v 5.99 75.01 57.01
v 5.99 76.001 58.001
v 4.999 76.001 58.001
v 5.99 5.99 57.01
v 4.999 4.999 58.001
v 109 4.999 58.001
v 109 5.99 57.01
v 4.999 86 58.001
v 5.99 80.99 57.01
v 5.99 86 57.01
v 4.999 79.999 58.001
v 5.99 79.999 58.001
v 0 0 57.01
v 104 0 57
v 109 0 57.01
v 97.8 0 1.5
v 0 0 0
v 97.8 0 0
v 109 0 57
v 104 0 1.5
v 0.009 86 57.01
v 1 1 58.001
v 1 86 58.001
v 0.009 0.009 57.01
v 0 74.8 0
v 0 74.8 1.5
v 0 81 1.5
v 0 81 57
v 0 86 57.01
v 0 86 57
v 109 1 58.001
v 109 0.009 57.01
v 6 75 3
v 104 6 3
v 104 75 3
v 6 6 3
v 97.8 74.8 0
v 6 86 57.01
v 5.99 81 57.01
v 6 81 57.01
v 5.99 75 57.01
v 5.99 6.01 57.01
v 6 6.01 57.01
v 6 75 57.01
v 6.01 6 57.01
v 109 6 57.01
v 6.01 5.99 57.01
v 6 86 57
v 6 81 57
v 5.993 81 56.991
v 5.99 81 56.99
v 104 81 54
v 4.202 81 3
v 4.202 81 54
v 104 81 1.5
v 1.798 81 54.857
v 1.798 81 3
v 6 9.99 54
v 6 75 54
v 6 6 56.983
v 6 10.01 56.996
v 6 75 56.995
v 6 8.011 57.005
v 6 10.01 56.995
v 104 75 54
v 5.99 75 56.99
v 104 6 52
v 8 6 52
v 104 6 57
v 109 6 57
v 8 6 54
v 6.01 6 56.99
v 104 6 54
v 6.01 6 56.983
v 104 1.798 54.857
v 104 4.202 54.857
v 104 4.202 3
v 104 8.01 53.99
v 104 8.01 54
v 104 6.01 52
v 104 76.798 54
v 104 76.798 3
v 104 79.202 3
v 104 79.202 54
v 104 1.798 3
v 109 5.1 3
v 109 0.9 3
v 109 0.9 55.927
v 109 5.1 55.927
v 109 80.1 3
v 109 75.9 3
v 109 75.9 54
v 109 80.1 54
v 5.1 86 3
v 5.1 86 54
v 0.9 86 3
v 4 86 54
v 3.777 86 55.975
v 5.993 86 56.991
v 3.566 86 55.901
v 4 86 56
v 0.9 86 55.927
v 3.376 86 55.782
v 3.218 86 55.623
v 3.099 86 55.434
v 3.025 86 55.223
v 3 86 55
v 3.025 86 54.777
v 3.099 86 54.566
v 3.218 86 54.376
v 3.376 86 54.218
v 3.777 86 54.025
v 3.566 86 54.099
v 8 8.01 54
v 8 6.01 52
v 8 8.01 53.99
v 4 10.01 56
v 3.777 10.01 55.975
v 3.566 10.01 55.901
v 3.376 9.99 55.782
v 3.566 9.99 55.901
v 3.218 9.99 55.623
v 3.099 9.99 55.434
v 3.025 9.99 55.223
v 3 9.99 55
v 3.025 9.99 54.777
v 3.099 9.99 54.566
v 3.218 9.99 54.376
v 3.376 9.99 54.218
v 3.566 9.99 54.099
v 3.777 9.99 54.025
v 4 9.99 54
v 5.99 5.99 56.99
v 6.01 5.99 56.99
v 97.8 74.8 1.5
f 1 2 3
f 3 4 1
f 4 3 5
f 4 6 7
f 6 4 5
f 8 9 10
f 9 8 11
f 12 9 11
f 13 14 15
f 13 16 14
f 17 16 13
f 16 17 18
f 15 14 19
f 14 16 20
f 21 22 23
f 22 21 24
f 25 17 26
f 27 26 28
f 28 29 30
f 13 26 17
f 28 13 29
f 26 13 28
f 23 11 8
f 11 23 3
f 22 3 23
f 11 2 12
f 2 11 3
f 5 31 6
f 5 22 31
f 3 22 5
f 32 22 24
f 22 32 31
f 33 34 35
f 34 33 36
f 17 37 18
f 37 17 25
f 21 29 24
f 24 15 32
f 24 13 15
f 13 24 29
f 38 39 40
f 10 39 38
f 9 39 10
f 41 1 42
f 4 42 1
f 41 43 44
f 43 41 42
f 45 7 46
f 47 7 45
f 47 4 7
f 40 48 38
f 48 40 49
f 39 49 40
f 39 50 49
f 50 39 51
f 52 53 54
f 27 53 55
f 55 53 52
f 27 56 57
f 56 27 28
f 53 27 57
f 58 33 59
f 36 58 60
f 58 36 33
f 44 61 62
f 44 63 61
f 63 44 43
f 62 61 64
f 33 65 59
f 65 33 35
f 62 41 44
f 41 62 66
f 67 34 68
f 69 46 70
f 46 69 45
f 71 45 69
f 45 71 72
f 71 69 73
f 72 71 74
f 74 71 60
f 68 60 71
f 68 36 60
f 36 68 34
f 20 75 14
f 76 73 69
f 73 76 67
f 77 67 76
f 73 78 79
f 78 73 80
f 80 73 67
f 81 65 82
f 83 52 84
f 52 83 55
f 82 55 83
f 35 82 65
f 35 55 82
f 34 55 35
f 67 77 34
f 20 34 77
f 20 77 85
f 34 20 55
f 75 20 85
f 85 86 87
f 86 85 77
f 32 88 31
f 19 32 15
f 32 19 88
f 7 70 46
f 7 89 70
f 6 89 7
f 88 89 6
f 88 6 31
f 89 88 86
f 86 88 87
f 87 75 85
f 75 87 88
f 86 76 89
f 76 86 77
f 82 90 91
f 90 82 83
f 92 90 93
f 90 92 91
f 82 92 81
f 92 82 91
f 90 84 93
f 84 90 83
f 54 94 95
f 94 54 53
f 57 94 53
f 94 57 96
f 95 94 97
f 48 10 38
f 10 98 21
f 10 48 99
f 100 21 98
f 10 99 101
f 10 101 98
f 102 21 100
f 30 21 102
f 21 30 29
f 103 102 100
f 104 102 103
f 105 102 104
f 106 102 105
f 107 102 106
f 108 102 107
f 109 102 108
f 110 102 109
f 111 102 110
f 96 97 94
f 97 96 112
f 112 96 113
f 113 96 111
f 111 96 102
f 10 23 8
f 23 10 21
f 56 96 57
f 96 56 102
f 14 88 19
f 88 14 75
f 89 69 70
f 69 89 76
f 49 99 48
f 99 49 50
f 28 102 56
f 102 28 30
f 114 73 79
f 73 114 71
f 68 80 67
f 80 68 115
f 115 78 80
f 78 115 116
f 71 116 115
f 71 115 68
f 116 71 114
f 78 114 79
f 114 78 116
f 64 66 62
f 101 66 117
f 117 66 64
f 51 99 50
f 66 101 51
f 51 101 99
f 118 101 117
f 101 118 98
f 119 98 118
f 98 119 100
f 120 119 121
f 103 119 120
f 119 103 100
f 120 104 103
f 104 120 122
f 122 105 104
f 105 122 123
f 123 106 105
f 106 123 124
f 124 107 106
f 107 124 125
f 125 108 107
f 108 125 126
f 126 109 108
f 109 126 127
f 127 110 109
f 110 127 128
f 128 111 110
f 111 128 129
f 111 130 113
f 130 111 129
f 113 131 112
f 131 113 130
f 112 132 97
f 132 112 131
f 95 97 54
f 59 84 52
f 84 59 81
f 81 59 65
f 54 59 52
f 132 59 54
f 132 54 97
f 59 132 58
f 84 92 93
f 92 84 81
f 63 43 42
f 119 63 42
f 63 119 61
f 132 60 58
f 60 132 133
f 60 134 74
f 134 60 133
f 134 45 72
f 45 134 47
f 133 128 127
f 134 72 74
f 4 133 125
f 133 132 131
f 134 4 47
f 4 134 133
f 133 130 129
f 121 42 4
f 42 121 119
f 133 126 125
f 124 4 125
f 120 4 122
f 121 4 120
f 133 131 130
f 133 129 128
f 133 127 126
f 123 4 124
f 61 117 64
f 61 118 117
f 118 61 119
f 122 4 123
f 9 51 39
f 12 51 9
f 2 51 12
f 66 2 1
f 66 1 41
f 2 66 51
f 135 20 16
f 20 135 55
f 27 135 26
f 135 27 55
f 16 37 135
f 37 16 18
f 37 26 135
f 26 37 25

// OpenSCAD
// ============================================================================
// cutlery_box.scad
// Graduated 3-chamber disposable-cutlery box (Option 3) — CUT-FROM-SOLID port
// of build_box.py, for a 120 x 120 x 120 mm printer (AOSEED).
//
// WHY THIS PORT EXISTS (the whole point):
//   The hand-mesh generator (build_box.py) could not keep the 1 mm rim chamfer
//   continuous across the female dovetail joints, because where a slot's flared
//   corner crosses the sloped chamfer it needs a true boolean intersection.
//   OpenSCAD HAS that boolean kernel, so here we do exactly the "cut-from-solid"
//   thing:
//      1. Build the ENTIRE box as ONE solid, WITH the chamfer already on it.
//      2. difference() out vertical dovetail prisms ( /_\ cross-section ),
//         running from just above the base plate up THROUGH the rim, to both
//         (a) form the sliding-dovetail joints, and
//         (b) split the box into 6 bed-sized pieces.
//   Because the cut is a real boolean through the already-chamfered solid, the
//   sloped chamfer<->slot edge is produced for free => the rim chamfer stays
//   CONTINUOUS across every joint, with none of the sliver hacks.
//
// ----------------------------------------------------------------------------
// HOW TO USE
//   In the app:  set `part` below (or use the Customizer dropdown), F5 to
//                preview, F6 to render, then File > Export > STL.
//   One piece (CLI):
//      openscad -o body_knife_A.stl -D 'part="knife_A"' cutlery_box.scad
//   ALL SIX (bash, run from this folder):
//      for p in knife_A knife_B fork_A fork_B spoon_A spoon_B; do \
//        openscad -o "body_$p.stl" -D "part=\"$p\"" cutlery_box.scad ; done
//   PNG preview of one piece:
//      openscad -o knife_B.png --imgsize=1400,1000 --autocenter --viewall \
//        -D 'part="knife_B"' cutlery_box.scad
//
//   Pieces are modelled in ASSEMBLED coordinates (floor-down, z=0 is the bed),
//   so importing all six STLs together shows the assembled box directly; your
//   slicer will auto-drop each one onto the plate for printing.
//
// BED SANITY: every piece is <= 120 mm in X, Y, Z.
//   Z = 58 mm. Widest piece = spoon at 117 mm (Y). A-halves reach 109 mm (X,
//   including the protruding dovetail key). All under 120.
//
// !! I could NOT run OpenSCAD to verify this file (no binary in my sandbox) !!
//   - The rim chamfer is a SMOOTH, true-45 bevel built from hull() frustums of
//     convex rectangles. Works in every OpenSCAD since ~2015 (incl. Homebrew
//     2021.01). No stepped staircase -- and, crucially, it makes box() a clean
//     well-formed solid so the per-part booleans resolve reliably (the old
//     14-slice staircase was fragile and CGAL was dropping the walls of the
//     interior parts, leaving only the key prisms => "floating boxes").
//   - roof() is still available behind USE_ROOF=true for those who have it
//     (2021.01+ snapshots); for THIS rectangular design it is identical, so it
//     is NOT required.
//   - After F6, check the console for "WARNING"/"not a valid 2-manifold".
//     If a tenon ever looks detached, bump EPS to 0.05.
// ============================================================================


/* [Part to render / export] */
part = "knife_A"; // [knife_A, knife_B, fork_A, fork_B, spoon_A, spoon_B, assembly]

/* [Chamfer method] */
// false = smooth hull() frustum bevel (default, any OpenSCAD); true = roof() (2021.01+)
USE_ROOF = false;

/* [Heights (mm)] */
BASE   = 3.0;     // floor / base-plate thickness
COMP_H = 55.0;    // interior wall height above the floor (cutlery stack depth)

/* [Walls (mm)] */
HOST_T   = 6.0;     // thickness of every wall (thick enough to host a dovetail)
HALF_LEN = 104.0;   // printed length of each half (A = near, B = far); <120 incl. key

/* [Chamber bays (mm)] */
N_COL     = 3;       // columns of cutlery per chamber
KNIFE_COL = 23.0;    // -> knife bay 69  (3 x 19 mm knives + play)
FORK_COL  = 33.0;    // -> fork  bay 99  (3 x 29 mm forks  + play)
SPOON_COL = 37.0;    // -> spoon bay 111 (3 x 34 mm spoons + play, trimmed <120)

/* [Dovetail joint (mm)] */
DT_DEPTH = 5.0;   // tail protrusion past the seam (male key depth)
DT_NECK  = 1.2;   // half-width at the seam face (narrow)
DT_FLARE = 2.1;   // half-width at the tip (wide -> locks)
DT_CLR   = 0.4;   // FLANK/seam slide clearance added to the female socket (do not change for fit)
DT_DEPTH_RELIEF = 0.3; // extra depth on the socket BACK only, so the tail tip never bottoms out

/* [Hidden-dovetail top cap / "hat" (mm)] */
// The dovetail otherwise shows its trapezoid outline on the TOP edge of the wall.
// To hide it, the MALE piece extends the wall's full-width top (chamfer included)
// across the key footprint -> a flush, continuous top. The FEMALE piece gets a
// matching top RECESS (cap footprint + CAP_CLR) so the cap drops straight in.
// Result: the top reads as one surface with a single straight seam line at the cap
// tip; the dovetail joinery lives entirely below the cap.
//
// SELF-SUPPORTING UNDERSIDE: the cap reaches the FULL wall width at the chamfer base
// (so the top edge reads as the wall extended, with NO recessed sliver on the outer
// face), and its underside is ONE planar ramp from the chamfer's OUTER CORNER
// (half-width HOST_T/2 at z = BODY_H-CHAMFER) down to the dovetail-neck half-width
// (CAP_FOOT) at CAP_SLANT_DEG from horizontal. No little horizontal step. The ramp
// reaching full width exactly at the chamfer base means "ramp top" == "chamfer base"
// (CAP_H is DERIVED). The FEMALE recess is the same ramp + CAP_CLR play.
// TRADEOFF: because the cap runs all the way to the outer corner, the female wall
// tapers to ~0 at z = BODY_H-CHAMFER -> a thin feather edge at the joint (gradual at
// CAP_SLANT_DEG, hidden inside the joint when assembled). Accepted per design intent.
CAP_SLANT_DEG = 50;     // cap underside ramp angle from horizontal (50 = self-supporting, long flare)
CAP_FOOT = DT_NECK;     // cap-underside half-width where it meets the dovetail neck
CAP_CLR = 0.3;          // slide clearance so the male cap seats into the female top recess

/* [Rim chamfer (mm)] */
CHAMFER = 1.0;    // 45-deg comfort break broken along the top wall edges

/* [Base half-lap / anti-warp (mm)] */
// Neighbouring base plates overlap as a HORIZONTAL half-lap (shiplap) at mid-base
// height, so corners stay coplanar (no lift/protrusion). Horizontal lap faces do
// NOT bind the vertical-drop assembly. Shingle direction: A->B and knife->fork->spoon.
LAP_LEN = 6;        // overlap past the A/B seam and the knife/fork seam
LAP_LEN_FS = 2;     // overlap past the fork/SPOON seam -- SMALLER: spoon is the
                    // tightest piece (117mm of the 120mm bed); a 6mm lap there
                    // would push spoon to 123mm. 2mm keeps spoon at 119mm.
LAP_Z   = BASE/2;   // 1.5 -- horizontal split height of the lap (bottom vs top half)
LAP_CLR = 0.2;      // in-plane clearance so the shelf isn't a press fit

/* [Lid — box features that receive a flat ORDERED clear sheet] */
// The lid itself is NOT printed: it's a flat ~2 mm PETG/Tritan sheet, bullnose-polished
// edges (r=LID_EDGE_R), ordered to size. We only model the box features that receive it.
LID_T            = 2.0;   // ordered sheet thickness
LID_EDGE_R       = 1.0;   // ordered sheet bullnose edge radius (for the sheet order spec)
LID_PLAY         = 0.4;   // total vertical play in the hinge groove (sheet + this)
LID_RECESS       = 2.0;   // lid TOP sits this far BELOW the rim, so the journal pocket is fully
                          // capped (rim caps the bullnose -> retains the lid when raised; tilt-in)
HINGE_AT_MINUS_X = true;  // hinge on the -x (303mm) end wall; clip on +x. (flip = mirror; default delivered)
// perimeter support ledge (lid underside rests on it at z = BODY_H-LID_T)
LEDGE_W          = 2.0;   // ledge inward protrusion (its underside ramps back at 45 deg -> self-supporting)
GROOVE_END_INSET = 0.0;   // groove reaches the corners but RUNS OUT smoothly there (no end-face / no
                          // exposed bore); GROOVE_TAPER sets the run-out length
GROOVE_TAPER     = 4.0;   // y-length over which the eased mouth tapers out at each groove end
// hinge journal (cut into the inner face of the hinge end wall, CONTINUOUS along the long edge)
GROOVE_DEPTH     = 3.0;   // 2mm lead-in slot + 1mm pocket radius -> journal sits 2mm back from the
                          // face so its cap clears the swing relief and RETAINS the lid
GROOVE_POCKET_R  = 1.0;   // journal half-cylinder radius (the bullnose sheet edge rolls in it)
// clip latch (one localized retainer, centered on the clip end wall)
CLIP_W           = 18.0;  // clip width
CLIP_LIP         = 0.4;   // retaining overhang (0.3 light .. 0.6 firm)
CLIP_RAMP_H      = 1.6;   // cam-ramp height above the rim (press-to-close)
// finger scallop (semicircular dish in the rim, centered on & aligned with the clip)
SCALLOP_W        = 16.0;  // scallop width
SCALLOP_DEPTH    = 6.0;   // how far it dishes down from the rim


/* [Hidden] */
EPS      = 0.01;          // tiny overlap so abutting solids fuse cleanly in CGAL
// Upper-chamber pieces (fork, spoon) were cut by a cell plane laid EXACTLY on the
// divider wall's far face (the lower chamber owns that wall). intersection() along a
// plane coincident with an existing box face makes CGAL leave a ZERO-THICKNESS copy
// of the wall face -> edge-manifold + "watertight" but degenerate (OpenSCAD shows it
// as a blue back-face; Tinkercad thickens it into a phantom block). SEAM_EPS nudges
// those cut planes a hair INTO the open bay so they no longer coincide with any box
// face -> no flap. 0.02 mm is physically nothing but is well clear of CGAL's tolerance.
SEAM_EPS = 0.02;
CUT_OVER = 1.0;           // how far dovetail cutters overshoot the rim (clean cut)

BODY_H    = BASE + COMP_H;     // 58  total height
END_WALL  = HOST_T;            // end walls are dovetail hosts too -> equally thick
TOTAL_LEN = 2 * HALF_LEN;      // 208 assembled length (end wall .. end wall)

// hidden-cap ramp geometry (derived).
//   CAP_HW    = cap MAX half-width = HOST_T/2 (the full wall edge) at the chamfer base.
//   CAP_RISE  = vertical height of the self-supporting CAP_SLANT_DEG underside ramp.
//   CAP_ZRAMP = where the cap reaches full width = the chamfer base (BODY_H-CHAMFER), so
//               the ramp runs straight to the chamfer OUTER CORNER (no horizontal step).
//   CAP_ZBOT  = cap bottom = ramp start; CAP_H derived from it (for reference/report).
//   CAP_ZRAMP_R = recess ramp top, shifted down by CAP_CLR so the recess ramp stays
//               parallel to the cap ramp with uniform play.
CAP_HW      = HOST_T/2;   // cap reaches the FULL wall edge at the chamfer base
CAP_RISE    = (CAP_HW - CAP_FOOT) * tan(CAP_SLANT_DEG);
CAP_ZRAMP   = BODY_H - CHAMFER;               // full width exactly at the chamfer base / outer corner
CAP_ZBOT    = CAP_ZRAMP - CAP_RISE;
CAP_H       = BODY_H - CAP_ZBOT;              // derived; reported
CAP_ZRAMP_R = CAP_ZRAMP;   // recess ramp ALSO tops at the chamfer corner (mirror the cap) -> no vertical lip
// sanity checks
assert(CAP_ZBOT > BASE + 1,
       "cap zone dips too low -- raise CAP_SLANT_DEG");
assert(CAP_HW >= DT_FLARE,
       "cap too narrow to cover the dovetail tail");

// NOTE: lid-derived constants are defined BELOW the Y-layout block, because some of
// them (INTERIOR_Y0/Y1, CLIP_CY) depend on OUTER_L / OUTER_R / EXT_W. See "lid derived".

// bay widths
KNIFE_BAY = N_COL * KNIFE_COL; // 69
FORK_BAY  = N_COL * FORK_COL;  // 99
SPOON_BAY = N_COL * SPOON_COL; // 111

// ---- Y layout (width direction): wall | bay | divider | bay | divider | bay | wall
KNIFE_Y0 = 0;
KNIFE_Y1 = HOST_T + KNIFE_BAY + HOST_T;        // 0..81   (outer wall + bay + divider)
FORK_Y0  = KNIFE_Y1;                           // 81
FORK_Y1  = FORK_Y0 + FORK_BAY + HOST_T;        // 81..186 (bay + divider)
SPOON_Y0 = FORK_Y1;                            // 186
SPOON_Y1 = SPOON_Y0 + SPOON_BAY + HOST_T;      // 186..303(bay + outer wall)
EXT_W    = SPOON_Y1;                           // 303 total width

// lengthwise wall Y-bands [y0,y1] (host the A/B dovetails) + their centers
OUTER_L  = [0, HOST_T];                                       // [0,6]    c=3
DIV_KF   = [HOST_T + KNIFE_BAY, HOST_T + KNIFE_BAY + HOST_T]; // [75,81]  c=78
DIV_FS   = [FORK_Y0 + FORK_BAY, FORK_Y0 + FORK_BAY + HOST_T]; // [180,186]c=183
OUTER_R  = [SPOON_Y1 - HOST_T, SPOON_Y1];                     // [297,303]c=300

// ---- lid derived ---- (placed AFTER OUTER_L/OUTER_R/EXT_W so nothing is forward-referenced)
LID_TOP_Z   = BODY_H - LID_RECESS;        // 56  lid TOP (recessed); rim z=58 rises LID_RECESS above it
LID_Z_UNDER = LID_TOP_Z - LID_T;          // 54  lid underside / ledge top / lowered-divider top
POCKET_CZ   = LID_TOP_Z - LID_T/2;        // 55  journal centre (lid mid) -> pocket top = LID_TOP_Z = capped
// hinge end-wall inner face x + inward direction; clip end-wall inner face x + inward dir
HINGE_INX   = HINGE_AT_MINUS_X ? END_WALL : TOTAL_LEN - END_WALL;       // 6  (default)
HINGE_IN    = HINGE_AT_MINUS_X ? 1 : -1;  // interior direction from the hinge wall (+x default)
CLIP_INX    = HINGE_AT_MINUS_X ? TOTAL_LEN - END_WALL : END_WALL;       // 202 (default)
CLIP_IN     = HINGE_AT_MINUS_X ? -1 : 1;  // interior direction from the clip wall (-x default)
POCKET_CX   = HINGE_INX - HINGE_IN*(GROOVE_DEPTH - GROOVE_POCKET_R);    // 5  pocket centre x (INTO the wall)
INTERIOR_Y0 = OUTER_L[1];                 // 6   inner face of the -y short wall
INTERIOR_Y1 = OUTER_R[0];                 // 297 inner face of the +y short wall
CLIP_CY     = EXT_W/2;                     // 151.5 clip/scallop centre (in the fork chamber)
assert(POCKET_CZ - GROOVE_POCKET_R > BASE + 1,
       "journal dips too low -- reduce LID_RECESS or LID_T");
assert(POCKET_CZ + GROOVE_POCKET_R <= LID_TOP_Z + EPS,
       "journal not capped -- lower the lid (raise LID_RECESS) or shrink GROOVE_POCKET_R");
// NOTE: with LID_RECESS the lid underside (and lowered dividers) sit BELOW CAP_ZBOT. That is
// intended: the inner dividers are cut flat below the cap zone (their hidden caps are removed,
// but the lid covers them); the perimeter/end-wall caps are untouched (full-height walls).

// the three OPEN bays are rectangular holes in the wall footprint:
//   footprint = outer rectangle MINUS these bays  (== the 6 walls; verified).
// The smooth chamfer is built from exactly this decomposition.
BAY_X0 = END_WALL;              // 6
BAY_X1 = TOTAL_LEN - END_WALL;  // 202
BAYS = [
    [BAY_X0, BAY_X1, HOST_T,   HOST_T + KNIFE_BAY],   // knife bay [6,202] x [6,75]
    [BAY_X0, BAY_X1, FORK_Y0,  FORK_Y0 + FORK_BAY],   // fork  bay [6,202] x [81,180]
    [BAY_X0, BAY_X1, SPOON_Y0, SPOON_Y0 + SPOON_BAY], // spoon bay [6,202] x [186,297]
];

YC_OUTL  = OUTER_L[0] + HOST_T/2;   // 3   outer-left wall center
YC_DIVKF = DIV_KF[0]  + HOST_T/2;   // 78  knife/fork divider center
YC_DIVFS = DIV_FS[0]  + HOST_T/2;   // 183 fork/spoon divider center
YC_OUTR  = OUTER_R[0] + HOST_T/2;   // 300 outer-right wall center

// seams
AB_SEAM = HALF_LEN;               // 104  A/B length seam (x)
SEAM_KF = FORK_Y0;                // 81   knife/fork width seam (y)
SEAM_FS = SPOON_Y0;              // 186  fork/spoon width seam (y)
ENDC_A  = END_WALL/2;             // 3    A end-wall center (x) -> chamber dovetails
ENDC_B  = TOTAL_LEN - END_WALL/2; // 205  B end-wall center (x)


// ============================================================================
// 2D wall footprint (cross-section of all walls, constant in z for the straight
// part). Union of: 2 full-width end walls + 4 lengthwise walls between them.
// ============================================================================
module wall_footprint_2d() {
    // footprint = outer rectangle minus the 3 open bays  (== the 6 walls)
    difference() {
        square([TOTAL_LEN, EXT_W]);
        for (b = BAYS) translate([b[0], b[2]]) square([b[1] - b[0], b[3] - b[2]]);
    }
}

// ============================================================================
// The full chamfered box solid = base plate + walls with a continuous 1 mm
// top-rim chamfer. Built ONCE; every piece is carved out of this.
// ============================================================================
module chamfer_cap() {
    // SMOOTH 45 rim chamfer over z[BODY_H-CHAMFER, BODY_H], in absolute coords.
    zm = BODY_H - CHAMFER;
    if (USE_ROOF) {
        // exact straight-skeleton roof, capped at CHAMFER height (needs roof()).
        intersection() {
            translate([0,0,zm]) roof() wall_footprint_2d();
            translate([0,0,zm]) linear_extrude(CHAMFER + EPS) wall_footprint_2d();
        }
    } else {
        // DEFAULT: true 45 bevel as hull() frustums of CONVEX rectangles -> smooth
        // AND a clean manifold.  Since footprint = outer - bays, the chamfer of the
        // footprint = (outer rectangle beveled inward) MINUS (each bay beveled so it
        // grows toward the top, which bevels every bay-facing rim).  All hull()s are
        // on convex rectangles, so nothing gets convex-filled.
        difference() {
            // outer perimeter frustum: full outer rect at zm -> inset by CHAMFER at top
            hull() {
                translate([0,0,zm])     linear_extrude(0.001) square([TOTAL_LEN, EXT_W]);
                translate([0,0,BODY_H]) linear_extrude(0.001) offset(delta=-CHAMFER) square([TOTAL_LEN, EXT_W]);
            }
            // each bay grows by CHAMFER toward the top -> bevels its surrounding rim.
            // (overshoots z a hair past both ends so the cut is clean.)
            for (b = BAYS)
                hull() {
                    translate([0,0,zm-EPS])     linear_extrude(0.001)
                        translate([b[0],b[2]]) offset(delta=-EPS)        square([b[1]-b[0], b[3]-b[2]]);
                    translate([0,0,BODY_H+EPS]) linear_extrude(0.001)
                        translate([b[0],b[2]]) offset(delta=CHAMFER+EPS) square([b[1]-b[0], b[3]-b[2]]);
                }
        }
    }
}

module box() {
    zm = BODY_H - CHAMFER;
    union() {
        cube([TOTAL_LEN, EXT_W, BASE]);                                        // base plate z[0,3]
        translate([0,0,BASE]) linear_extrude(zm - BASE + EPS) wall_footprint_2d(); // straight walls z[3,57]
        chamfer_cap();                                                         // smooth chamfer z[57,58]
    }
}

// ============================================================================
// Dovetail prisms ( /_\ ). Vertical, z[BASE, BODY_H+CUT_OVER] so they cut
// through the rim but leave the base plate continuous. The near face is pushed
// back EPS so a male key always fuses to its wall.
//   male key   : half_n=DT_NECK,         half_f=DT_FLARE
//   female slot: half_n=DT_NECK+DT_CLR,  half_f=DT_FLARE+DT_CLR
// ============================================================================
module dt_prism_X(seam_x, yc, half_n, half_f) {   // perpendicular to X, grows +X
    translate([0,0,BASE]) linear_extrude(BODY_H - BASE + CUT_OVER)
        polygon([[seam_x - EPS,        yc - half_n],
                 [seam_x + DT_DEPTH,   yc - half_f],
                 [seam_x + DT_DEPTH,   yc + half_f],
                 [seam_x - EPS,        yc + half_n]]);
}
module dt_prism_Y(seam_y, xc, half_n, half_f) {   // perpendicular to Y, grows +Y
    translate([0,0,BASE]) linear_extrude(BODY_H - BASE + CUT_OVER)
        polygon([[xc - half_n, seam_y - EPS],
                 [xc - half_f, seam_y + DT_DEPTH],
                 [xc + half_f, seam_y + DT_DEPTH],
                 [xc + half_n, seam_y - EPS]]);
}
module ab_key   (yc)        { dt_prism_X(AB_SEAM, yc, DT_NECK, DT_FLARE); }
module ch_key   (seam_y, xc){ dt_prism_Y(seam_y, xc, DT_NECK, DT_FLARE); }

// Female sockets = male + DT_CLR on the flanks/seam (unchanged), PLUS a straight
// back-face relief of DT_DEPTH_RELIEF so the tail tip never bottoms out. The
// relief is a rectangle tacked onto the trapezoid's tip at the SAME flare width,
// so the angled flank faces (and their 0.4 mm slide clearance) are untouched.
module ab_socket(yc) {
    dt_prism_X(AB_SEAM, yc, DT_NECK + DT_CLR, DT_FLARE + DT_CLR);
    translate([0,0,BASE]) linear_extrude(BODY_H - BASE + CUT_OVER)
        translate([AB_SEAM + DT_DEPTH, yc - (DT_FLARE + DT_CLR)])
            square([DT_DEPTH_RELIEF, 2*(DT_FLARE + DT_CLR)]);          // back relief, +X
}
module ch_socket(seam_y, xc) {
    dt_prism_Y(seam_y, xc, DT_NECK + DT_CLR, DT_FLARE + DT_CLR);
    translate([0,0,BASE]) linear_extrude(BODY_H - BASE + CUT_OVER)
        translate([xc - (DT_FLARE + DT_CLR), seam_y + DT_DEPTH])
            square([2*(DT_FLARE + DT_CLR), DT_DEPTH_RELIEF]);          // back relief, +Y
}

// ===== hidden-dovetail top cap ("hat"), SELF-SUPPORTING underside ===============
// MALE cap: a FULL-wall-width hat whose underside is ONE planar ramp from the chamfer's
// OUTER CORNER (half-width CAP_HW = HOST_T/2 at CAP_ZRAMP = BODY_H-CHAMFER) down to the
// dovetail-neck half-width (CAP_FOOT) at CAP_SLANT_DEG from horizontal -> the self-
// supporting shoulder, running straight to the corner (no horizontal step). Built as
// hull(narrow bottom slab buried in the tail neck, full-width top slab through the rim);
// box() trims it to the wall and adds the continuous rim chamfer for free, so the outer
// top edge reads as the wall extended (no recessed sliver). The protruding NOSE is left
// SQUARE (vertical) -- hidden in the female socket when assembled.
// TRADEOFF: the female wall tapers to ~0 at z=BODY_H-CHAMFER (a thin feather edge at the
// joint, gradual at CAP_SLANT_DEG) -- accepted per design intent.
module ab_cap(yc) {   // A/B seam, grows +X past the seam (length direction)
    hull() {
        translate([AB_SEAM - EPS, yc - CAP_FOOT, CAP_ZBOT])
            cube([DT_DEPTH + EPS, 2*CAP_FOOT, EPS]);
        translate([AB_SEAM - EPS, yc - CAP_HW,   CAP_ZRAMP])
            cube([DT_DEPTH + EPS, 2*CAP_HW, (BODY_H + CUT_OVER) - CAP_ZRAMP]);
    }
}
module ch_cap(seam_y, xc) {   // chamber seam, grows +Y past the seam (in the end wall)
    hull() {
        translate([xc - CAP_FOOT, seam_y - EPS, CAP_ZBOT])
            cube([2*CAP_FOOT, DT_DEPTH + EPS, EPS]);
        translate([xc - CAP_HW,   seam_y - EPS, CAP_ZRAMP])
            cube([2*CAP_HW, DT_DEPTH + EPS, (BODY_H + CUT_OVER) - CAP_ZRAMP]);
    }
}
// FEMALE recess: the SAME ramp grown by CAP_CLR (flanks, tip, floor, and ramp shifted down
// by CAP_CLR so it stays parallel) -> the cap seats with uniform slide clearance. It opens
// to the wall edge (and a hair past, into air) so the cap's full-width corner drops in;
// this is what leaves the thin female feather at the top (accepted). Open upward + toward seam.
module ab_cap_neg(yc) {
    hull() {
        translate([AB_SEAM - EPS, yc - (CAP_FOOT + CAP_CLR), CAP_ZBOT - CAP_CLR])
            cube([DT_DEPTH + CAP_CLR + EPS, 2*(CAP_FOOT + CAP_CLR), EPS]);
        translate([AB_SEAM - EPS, yc - (CAP_HW + EPS), CAP_ZRAMP_R])
            cube([DT_DEPTH + CAP_CLR + EPS, 2*(CAP_HW + EPS), (BODY_H + CUT_OVER + 1) - CAP_ZRAMP_R]);
    }
}
module ch_cap_neg(seam_y, xc) {
    hull() {
        translate([xc - (CAP_FOOT + CAP_CLR), seam_y - EPS, CAP_ZBOT - CAP_CLR])
            cube([2*(CAP_FOOT + CAP_CLR), DT_DEPTH + CAP_CLR + EPS, EPS]);
        translate([xc - (CAP_HW + EPS), seam_y - EPS, CAP_ZRAMP_R])
            cube([2*(CAP_HW + EPS), DT_DEPTH + CAP_CLR + EPS, (BODY_H + CUT_OVER + 1) - CAP_ZRAMP_R]);
    }
}

// rectangular cell (x[xa,xb], y[ya,yb], full height + margin) used to split pieces
module cell(xa, xb, ya, yb) {
    translate([xa, ya, -1]) cube([xb - xa, yb - ya, BODY_H + 11]);
}

// ===== base half-lap (shiplap) =================================================
// HORIZONTAL lap at mid-base height: the shelf-owner keeps its BOTTOM half
// (z 0..LAP_Z) extending LAP_LEN past the seam; the neighbour has its bottom half
// REMOVED there (keeps only the top half) and lands flat on the shelf. Horizontal
// faces => no binding during the vertical drop. Shelves live entirely in the base
// (z < BASE), well clear of the wall dovetails (z >= BASE).
// Shingle = FEMALE-first (matches the no-notch dovetail assembly order, which
// lowers the male piece onto the female): the B half owns the A/B shelf (grows
// -X into A) and the UPPER chamber (fork, spoon) owns the chamber shelf (grows
// -Y into the lower chamber).  Order: spoon, fork, knife; B before A.
module lap_shelf_X(y0, y1) {                 // B-side shelf, grows -X into A past AB_SEAM
    // +EPS past AB_SEAM so the shelf interpenetrates (not just abuts) its own B body -> fuses cleanly.
    translate([AB_SEAM - LAP_LEN, y0, 0]) cube([LAP_LEN + EPS, y1 - y0, LAP_Z]);
}
module lap_neg_X(y0, y1) {                   // A-side: remove bottom half to receive it
    translate([AB_SEAM - LAP_LEN - LAP_CLR, y0 - EPS, -EPS])
        cube([LAP_LEN + LAP_CLR + EPS, (y1 - y0) + 2*EPS, LAP_Z + EPS]);
}
module lap_shelf_Y(seam_y, x0, x1, ln=LAP_LEN) {   // upper-chamber shelf, grows -Y into lower
    // grows -Y by `ln` into the lower chamber AND +Y by 2*SEAM_EPS past the seam so it
    // always overlaps the (SEAM_EPS-nudged) body floor and stays fused -> no floating shelf.
    translate([x0, seam_y - ln, 0]) cube([x1 - x0, ln + 2*SEAM_EPS, LAP_Z]);
}
module lap_neg_Y(seam_y, x0, x1, ln=LAP_LEN) {     // lower-chamber: remove bottom half
    translate([x0 - EPS, seam_y - ln - LAP_CLR, -EPS])
        cube([(x1 - x0) + 2*EPS, ln + LAP_CLR + EPS, LAP_Z + EPS]);
}

// ============================================================================
// LID FEATURES (receive a flat ORDERED clear sheet; the sheet is not printed).
// All features live at the TOP (z >= ~52), ABOVE the dovetail engagement, the half-lap
// (z<1.5) and most of the hat, so the vertical-drop assembly and joints are untouched.
// EPS overlaps throughout; no coincident coplanar faces with the existing walls.
// Default orientation: HINGE on the -x end wall (A pieces), CLIP on the +x end wall
// (B pieces), clip+scallop centred on the fork (middle) chamber.
// ============================================================================

// --- perimeter support ledge: 45-deg self-supporting brackets; rest face at LID_Z_UNDER.
//     Runs along the CLIP end wall + the two short outer walls. (Hinge wall uses the groove.)
//     Built as hull(thin top edge, wall column) -> a triangular bracket whose underside is
//     a 45-deg ramp (prints floor-down with no support). ADDED to each piece (clipped by cell).
//     Each run is INSET by LEDGE_W from the perpendicular walls so the three brackets never
//     overlap at a corner and the wall's normal chamfer wraps every corner uninterrupted.
module lid_ledge() {
    cy0 = INTERIOR_Y0 + LEDGE_W;  cy1 = INTERIOR_Y1 - LEDGE_W;  cyl = cy1 - cy0;   // clip-run y span (inset)
    sx0 = END_WALL    + LEDGE_W;  sxl = (TOTAL_LEN - 2*END_WALL) - 2*LEDGE_W;       // short-run x span (inset)
    // clip end wall (x = CLIP_INX), bracket protrudes toward interior (CLIP_IN)
    hull() {
        translate([CLIP_INX + CLIP_IN*LEDGE_W, cy0, LID_Z_UNDER - EPS]) cube([EPS, cyl, EPS]);
        translate([CLIP_INX - EPS,             cy0, LID_Z_UNDER - LEDGE_W]) cube([2*EPS, cyl, LEDGE_W]);
    }
    // OUTER_L short wall (y = INTERIOR_Y0), bracket protrudes +y
    hull() {
        translate([sx0, INTERIOR_Y0 + LEDGE_W, LID_Z_UNDER - EPS]) cube([sxl, EPS, EPS]);
        translate([sx0, INTERIOR_Y0 - EPS,     LID_Z_UNDER - LEDGE_W]) cube([sxl, 2*EPS, LEDGE_W]);
    }
    // OUTER_R short wall (y = INTERIOR_Y1), bracket protrudes -y
    hull() {
        translate([sx0, INTERIOR_Y1 - LEDGE_W, LID_Z_UNDER - EPS]) cube([sxl, EPS, EPS]);
        translate([sx0, INTERIOR_Y1 - EPS,     LID_Z_UNDER - LEDGE_W]) cube([sxl, 2*EPS, LEDGE_W]);
    }
}

// --- hinge groove: ONE 2D cross-section (journal bore + lead-in slot + 45-deg swing ramp),
//     CAPPED at the recessed lid top (LID_TOP_Z), swept along the wall. At BOTH ends the whole
//     profile RUNS OUT smoothly -- it tapers to the inner-top rim corner (HINGE_INX, BODY_H) --
//     so there is NO end-face and NO exposed bore at the corners; the groove just fades into the
//     wall. The rim caps the bullnose (retains the lid, tilt-in); the 45-deg ramp is self-
//     supporting and gives the swing clearance; the cap stays full over the bullnose => retains.
module groove_profile() {                            // 2D cross-section in (x, z)
    union() {
        translate([POCKET_CX, POCKET_CZ]) circle(r = GROOVE_POCKET_R, $fn = 28);              // journal bore
        translate([POCKET_CX, LID_Z_UNDER]) square([HINGE_INX - POCKET_CX + EPS, LID_T]);     // lead-in slot
        polygon([[POCKET_CX, LID_TOP_Z], [HINGE_INX + EPS, LID_TOP_Z], [HINGE_INX + EPS, BODY_H - CHAMFER]]); // swing relief (stays BELOW the rim chamfer)
    }
}
module groove_extrude(y0, y1) {                      // sweep the profile along the wall, y0..y1
    translate([0, y0, 0]) rotate([90,0,0]) translate([0,0,-(y1 - y0)]) linear_extrude(y1 - y0) groove_profile();
}
module groove_runout(yApex, yFull) {                 // groove fades to the inner-top rim corner at yApex
    hull() {
        groove_extrude(yFull - EPS, yFull + EPS);    // thin full-profile slice at yFull
        translate([HINGE_INX - EPS, yApex - EPS, (BODY_H - CHAMFER) - EPS]) cube([2*EPS, 2*EPS, 2*EPS]);  // collapse below the chamfer
    }
}
module hinge_groove() {
    gy0 = INTERIOR_Y0 + GROOVE_END_INSET;            // 6   (reaches the corner; runs out there)
    gy1 = INTERIOR_Y1 - GROOVE_END_INSET;            // 297
    ro  = min(GROOVE_TAPER, (gy1 - gy0)/2 - EPS);    // run-out length at each end
    groove_extrude(gy0 + ro, gy1 - ro);              // full-depth middle
    groove_runout(gy0, gy0 + ro);                    // -y run-out (fades into the corner)
    groove_runout(gy1, gy1 - ro);                    // +y run-out
}

// --- lower the inner chamber dividers to the lid underside (mid-support, no sag).
//     Removes the divider top over the full length; outer walls keep full height.
module divider_lower() {
    // x-span is the CHAMBER BAY only [BAY_X0, BAY_X1] (+EPS overlap into the end walls so the
    // cut is manifold). The end/outer walls keep their full BODY_H tops; only the two INNER
    // dividers (DIV_KF, DIV_FS) are lowered.
    translate([BAY_X0 - EPS, DIV_KF[0], LID_Z_UNDER]) cube([BAY_X1 - BAY_X0 + 2*EPS, HOST_T, BODY_H - LID_Z_UNDER + CUT_OVER]);
    translate([BAY_X0 - EPS, DIV_FS[0], LID_Z_UNDER]) cube([BAY_X1 - BAY_X0 + 2*EPS, HOST_T, BODY_H - LID_Z_UNDER + CUT_OVER]);
}

// --- retaining clip (ADDED): a lip on the clip end wall, centred on CLIP_CY, that overhangs
//     the RECESSED lid top (LID_TOP_Z) by CLIP_LIP and holds it down. A lead-in ramp above the
//     lip (up to LID_TOP_Z+CLIP_RAMP_H, still below the rim) cams the lid under as it swings
//     closed. Anchored into the wall (x = CLIP_INX-CLIP_IN*HOST_T/2). Added AFTER the scallop
//     cut so the scallop never undercuts it. No longer protrudes above the rim.
module lid_clip() {
    translate([0, CLIP_CY - CLIP_W/2, 0]) rotate([90,0,0]) translate([0,0,-CLIP_W]) linear_extrude(CLIP_W)
        polygon([[CLIP_INX - CLIP_IN*HOST_T/2, LID_TOP_Z - 0.8],         // anchor low, into the wall (fuse)
                 [CLIP_INX + CLIP_IN*CLIP_LIP, LID_TOP_Z],               // lip tip: overhang over the lid top
                 [CLIP_INX + CLIP_IN*CLIP_LIP, LID_TOP_Z + 0.4],         // lip front
                 [CLIP_INX - CLIP_IN*HOST_T/2, LID_TOP_Z + CLIP_RAMP_H]]);// lead-in ramp up into the wall
}

// --- finger scallop (CUT): a semicircular dish in the rim's INNER edge at the clip, so a
//     fingertip reaches under the lid edge to release it. Interior half only (does not
//     touch the wall body or the clip's anchor).
module lid_scallop() {
    intersection() {
        translate([CLIP_INX, CLIP_CY, BODY_H - SCALLOP_DEPTH]) cylinder(h = SCALLOP_DEPTH + EPS, r = SCALLOP_W/2, $fn = 40);
        translate([CLIP_INX + (CLIP_IN<0 ? -SCALLOP_W : 0), CLIP_CY - SCALLOP_W, BODY_H - SCALLOP_DEPTH - EPS])
            cube([SCALLOP_W, 2*SCALLOP_W, SCALLOP_DEPTH + 2*EPS]);
    }
}

// ============================================================================
// The six pieces.  piece = intersection(box, cell + own male keys) - own sockets
//   A halves are MALE on the A/B seam (keep the key); B halves are FEMALE (slot).
//   On a chamber seam the LEFT chamber is male (+Y), the right chamber is female.
// ============================================================================
// Base half-lap shingling (FEMALE-first, Option 1):
//   A/B seam  -> the B half owns the bottom shelf (grows -X), A has the negative.
//   chamber   -> the UPPER chamber (fork, spoon) owns the shelf (grows -Y); the
//                lower chamber (knife, fork) has the negative.
//   Assembly order: spoon, fork, knife; B before A (male lowered onto female).
// Center crossings (104,81)&(104,186): the CHAMBER shelf (fork_A / spoon_A) owns the
//   crossing square; the B-half A/B shelf (knife_B / fork_B) is CLIPPED short of the
//   chamber seam by LAP_LEN so two shelves never collide.
module knife_A() {                                       // placed LAST; receives everything
    difference() {
        union() {
            intersection() {
                box();
                union() {
                    cell(-1, AB_SEAM, KNIFE_Y0 - 1, KNIFE_Y1);
                    ab_key(YC_OUTL); ab_key(YC_DIVKF); ch_key(SEAM_KF, ENDC_A);
                    ab_cap(YC_OUTL); ab_cap(YC_DIVKF); ch_cap(SEAM_KF, ENDC_A);  // hide tops (male)
                }
            }
            intersection() { lid_ledge(); cell(-1, AB_SEAM, KNIFE_Y0 - 1, KNIFE_Y1); }  // lid support ledge
        }
        lap_neg_X(KNIFE_Y0, KNIFE_Y1);            // receive knife_B's A/B shelf
        lap_neg_Y(SEAM_KF, 0, AB_SEAM);           // receive fork_A's chamber shelf
        hinge_groove(); divider_lower(); lid_scallop();   // lid cuts (groove hits A pieces; divider/scallop where present)
    }
}

module knife_B() {
    difference() {
        union() {
            intersection() {
                box();
                union() {
                    cell(AB_SEAM, TOTAL_LEN + 1, KNIFE_Y0 - 1, KNIFE_Y1);
                    ch_key(SEAM_KF, ENDC_B);
                    ch_cap(SEAM_KF, ENDC_B);                // hide top (male, chamber)
                }
            }
            lap_shelf_X(KNIFE_Y0, KNIFE_Y1 - LAP_LEN);  // A/B shelf -> knife_A (CLIPPED at y=81 crossing)
            intersection() { lid_ledge(); cell(AB_SEAM, TOTAL_LEN + 1, KNIFE_Y0 - 1, KNIFE_Y1); }  // lid support ledge
        }
        ab_socket(YC_OUTL); ab_socket(YC_DIVKF);
        ab_cap_neg(YC_OUTL); ab_cap_neg(YC_DIVKF);      // top recesses to receive knife_A's caps (female)
        lap_neg_Y(SEAM_KF, AB_SEAM, TOTAL_LEN);         // receive fork_B's chamber shelf
        hinge_groove(); divider_lower(); lid_scallop();   // lid cuts
    }
}

module fork_A() {
    difference() {
        union() {
            intersection() {
                box();
                union() {
                    cell(-1, AB_SEAM, FORK_Y0 + SEAM_EPS, FORK_Y1);  // -Y cut nudged off the divider face
                    ab_key(YC_DIVFS); ch_key(SEAM_FS, ENDC_A);
                    ab_cap(YC_DIVFS); ch_cap(SEAM_FS, ENDC_A);       // hide tops (male)
                }
            }
            lap_shelf_Y(SEAM_KF, 0, AB_SEAM);           // chamber shelf -> knife_A (owns crossing)
            intersection() { lid_ledge(); cell(-1, AB_SEAM, FORK_Y0 + SEAM_EPS, FORK_Y1); }  // lid support ledge (none in fork-A)
        }
        lap_neg_X(FORK_Y0, FORK_Y1);                    // receive fork_B's A/B shelf
        ch_socket(SEAM_KF, ENDC_A);
        ch_cap_neg(SEAM_KF, ENDC_A);                    // top recess to receive knife_A's chamber cap (female)
        lap_neg_Y(SEAM_FS, 0, AB_SEAM, LAP_LEN_FS);     // receive spoon_A's (small) chamber shelf
        hinge_groove(); divider_lower(); lid_scallop();   // lid cuts (groove = fork-A hinge segment; divider = DIV_FS)
    }
}

module fork_B() {
    union() {
        difference() {
            union() {
                intersection() {
                    box();
                    union() {
                        cell(AB_SEAM, TOTAL_LEN + 1, FORK_Y0 + SEAM_EPS, FORK_Y1);  // -Y cut nudged off the divider face
                        ch_key(SEAM_FS, ENDC_B);
                        ch_cap(SEAM_FS, ENDC_B);                // hide top (male, chamber)
                    }
                }
                lap_shelf_X(FORK_Y0, FORK_Y1 - LAP_LEN_FS); // A/B shelf -> fork_A (CLIPPED at y=186 crossing)
                lap_shelf_Y(SEAM_KF, AB_SEAM, TOTAL_LEN);   // chamber shelf -> knife_B
                intersection() { lid_ledge(); cell(AB_SEAM, TOTAL_LEN + 1, FORK_Y0 + SEAM_EPS, FORK_Y1); }  // lid ledge (clip-end run)
            }
            ab_socket(YC_DIVFS);
            ab_cap_neg(YC_DIVFS);                           // top recess to receive fork_A's A/B cap (female)
            ch_socket(SEAM_KF, ENDC_B);
            ch_cap_neg(SEAM_KF, ENDC_B);                    // top recess to receive knife_B's chamber cap (female)
            lap_neg_Y(SEAM_FS, AB_SEAM, TOTAL_LEN, LAP_LEN_FS); // receive spoon_B's (small) chamber shelf
            hinge_groove(); divider_lower(); lid_scallop();     // lid cuts (scallop lands here)
        }
        intersection() { lid_clip(); cell(AB_SEAM, TOTAL_LEN + 1, FORK_Y0 + SEAM_EPS, FORK_Y1); }  // retaining clip, added AFTER the scallop cut
    }
}

module spoon_A() {
    difference() {
        union() {
            intersection() {
                box();
                union() {
                    cell(-1, AB_SEAM, SPOON_Y0 + SEAM_EPS, SPOON_Y1 + 1);  // -Y cut nudged off the divider face
                    ab_key(YC_OUTR);
                    ab_cap(YC_OUTR);                        // hide top (male)
                }
            }
            lap_shelf_Y(SEAM_FS, 0, AB_SEAM, LAP_LEN_FS); // chamber shelf -> fork_A (small; owns crossing)
            intersection() { lid_ledge(); cell(-1, AB_SEAM, SPOON_Y0 + SEAM_EPS, SPOON_Y1 + 1); }  // lid support ledge (OUTER_R run)
        }
        lap_neg_X(SPOON_Y0, SPOON_Y1);                  // receive spoon_B's A/B shelf
        ch_socket(SEAM_FS, ENDC_A);
        ch_cap_neg(SEAM_FS, ENDC_A);                    // top recess to receive fork_A's chamber cap (female)
        hinge_groove(); divider_lower(); lid_scallop();   // lid cuts (groove = spoon-A hinge segment)
    }
}

module spoon_B() {                                      // placed FIRST; owns shelves
    difference() {
        union() {
            intersection() {
                box();
                union() {
                    cell(AB_SEAM, TOTAL_LEN + 1, SPOON_Y0 + SEAM_EPS, SPOON_Y1 + 1);  // -Y cut nudged off the divider face
                }
            }
            lap_shelf_X(SPOON_Y0, SPOON_Y1);            // A/B shelf -> spoon_A
            lap_shelf_Y(SEAM_FS, AB_SEAM, TOTAL_LEN, LAP_LEN_FS); // chamber shelf -> fork_B (small)
            intersection() { lid_ledge(); cell(AB_SEAM, TOTAL_LEN + 1, SPOON_Y0 + SEAM_EPS, SPOON_Y1 + 1); }  // lid ledge (OUTER_R + clip-end runs)
        }
        ab_socket(YC_OUTR);
        ab_cap_neg(YC_OUTR);                            // top recess to receive spoon_A's A/B cap (female)
        ch_socket(SEAM_FS, ENDC_B);
        ch_cap_neg(SEAM_FS, ENDC_B);                    // top recess to receive fork_B's chamber cap (female)
        hinge_groove(); divider_lower(); lid_scallop();   // lid cuts
    }
}

// Fast preview: the full continuous-chamfer box (no cuts). The six part modules
// above are the real, separable pieces. To instead see the TRUE assembled
// pieces with their joints (slower — 6 booleans), replace box(); below with:
//   knife_A(); knife_B(); fork_A(); fork_B(); spoon_A(); spoon_B();
module assembly() {
    box();
}

// ============================================================================
// Render dispatch
// ============================================================================
if      (part == "knife_A")  knife_A();
else if (part == "knife_B")  knife_B();
else if (part == "fork_A")   fork_A();
else if (part == "fork_B")   fork_B();
else if (part == "spoon_A")  spoon_A();
else if (part == "spoon_B")  spoon_B();
else if (part == "assembly") assembly();
else echo(str("Unknown part: ", part));
